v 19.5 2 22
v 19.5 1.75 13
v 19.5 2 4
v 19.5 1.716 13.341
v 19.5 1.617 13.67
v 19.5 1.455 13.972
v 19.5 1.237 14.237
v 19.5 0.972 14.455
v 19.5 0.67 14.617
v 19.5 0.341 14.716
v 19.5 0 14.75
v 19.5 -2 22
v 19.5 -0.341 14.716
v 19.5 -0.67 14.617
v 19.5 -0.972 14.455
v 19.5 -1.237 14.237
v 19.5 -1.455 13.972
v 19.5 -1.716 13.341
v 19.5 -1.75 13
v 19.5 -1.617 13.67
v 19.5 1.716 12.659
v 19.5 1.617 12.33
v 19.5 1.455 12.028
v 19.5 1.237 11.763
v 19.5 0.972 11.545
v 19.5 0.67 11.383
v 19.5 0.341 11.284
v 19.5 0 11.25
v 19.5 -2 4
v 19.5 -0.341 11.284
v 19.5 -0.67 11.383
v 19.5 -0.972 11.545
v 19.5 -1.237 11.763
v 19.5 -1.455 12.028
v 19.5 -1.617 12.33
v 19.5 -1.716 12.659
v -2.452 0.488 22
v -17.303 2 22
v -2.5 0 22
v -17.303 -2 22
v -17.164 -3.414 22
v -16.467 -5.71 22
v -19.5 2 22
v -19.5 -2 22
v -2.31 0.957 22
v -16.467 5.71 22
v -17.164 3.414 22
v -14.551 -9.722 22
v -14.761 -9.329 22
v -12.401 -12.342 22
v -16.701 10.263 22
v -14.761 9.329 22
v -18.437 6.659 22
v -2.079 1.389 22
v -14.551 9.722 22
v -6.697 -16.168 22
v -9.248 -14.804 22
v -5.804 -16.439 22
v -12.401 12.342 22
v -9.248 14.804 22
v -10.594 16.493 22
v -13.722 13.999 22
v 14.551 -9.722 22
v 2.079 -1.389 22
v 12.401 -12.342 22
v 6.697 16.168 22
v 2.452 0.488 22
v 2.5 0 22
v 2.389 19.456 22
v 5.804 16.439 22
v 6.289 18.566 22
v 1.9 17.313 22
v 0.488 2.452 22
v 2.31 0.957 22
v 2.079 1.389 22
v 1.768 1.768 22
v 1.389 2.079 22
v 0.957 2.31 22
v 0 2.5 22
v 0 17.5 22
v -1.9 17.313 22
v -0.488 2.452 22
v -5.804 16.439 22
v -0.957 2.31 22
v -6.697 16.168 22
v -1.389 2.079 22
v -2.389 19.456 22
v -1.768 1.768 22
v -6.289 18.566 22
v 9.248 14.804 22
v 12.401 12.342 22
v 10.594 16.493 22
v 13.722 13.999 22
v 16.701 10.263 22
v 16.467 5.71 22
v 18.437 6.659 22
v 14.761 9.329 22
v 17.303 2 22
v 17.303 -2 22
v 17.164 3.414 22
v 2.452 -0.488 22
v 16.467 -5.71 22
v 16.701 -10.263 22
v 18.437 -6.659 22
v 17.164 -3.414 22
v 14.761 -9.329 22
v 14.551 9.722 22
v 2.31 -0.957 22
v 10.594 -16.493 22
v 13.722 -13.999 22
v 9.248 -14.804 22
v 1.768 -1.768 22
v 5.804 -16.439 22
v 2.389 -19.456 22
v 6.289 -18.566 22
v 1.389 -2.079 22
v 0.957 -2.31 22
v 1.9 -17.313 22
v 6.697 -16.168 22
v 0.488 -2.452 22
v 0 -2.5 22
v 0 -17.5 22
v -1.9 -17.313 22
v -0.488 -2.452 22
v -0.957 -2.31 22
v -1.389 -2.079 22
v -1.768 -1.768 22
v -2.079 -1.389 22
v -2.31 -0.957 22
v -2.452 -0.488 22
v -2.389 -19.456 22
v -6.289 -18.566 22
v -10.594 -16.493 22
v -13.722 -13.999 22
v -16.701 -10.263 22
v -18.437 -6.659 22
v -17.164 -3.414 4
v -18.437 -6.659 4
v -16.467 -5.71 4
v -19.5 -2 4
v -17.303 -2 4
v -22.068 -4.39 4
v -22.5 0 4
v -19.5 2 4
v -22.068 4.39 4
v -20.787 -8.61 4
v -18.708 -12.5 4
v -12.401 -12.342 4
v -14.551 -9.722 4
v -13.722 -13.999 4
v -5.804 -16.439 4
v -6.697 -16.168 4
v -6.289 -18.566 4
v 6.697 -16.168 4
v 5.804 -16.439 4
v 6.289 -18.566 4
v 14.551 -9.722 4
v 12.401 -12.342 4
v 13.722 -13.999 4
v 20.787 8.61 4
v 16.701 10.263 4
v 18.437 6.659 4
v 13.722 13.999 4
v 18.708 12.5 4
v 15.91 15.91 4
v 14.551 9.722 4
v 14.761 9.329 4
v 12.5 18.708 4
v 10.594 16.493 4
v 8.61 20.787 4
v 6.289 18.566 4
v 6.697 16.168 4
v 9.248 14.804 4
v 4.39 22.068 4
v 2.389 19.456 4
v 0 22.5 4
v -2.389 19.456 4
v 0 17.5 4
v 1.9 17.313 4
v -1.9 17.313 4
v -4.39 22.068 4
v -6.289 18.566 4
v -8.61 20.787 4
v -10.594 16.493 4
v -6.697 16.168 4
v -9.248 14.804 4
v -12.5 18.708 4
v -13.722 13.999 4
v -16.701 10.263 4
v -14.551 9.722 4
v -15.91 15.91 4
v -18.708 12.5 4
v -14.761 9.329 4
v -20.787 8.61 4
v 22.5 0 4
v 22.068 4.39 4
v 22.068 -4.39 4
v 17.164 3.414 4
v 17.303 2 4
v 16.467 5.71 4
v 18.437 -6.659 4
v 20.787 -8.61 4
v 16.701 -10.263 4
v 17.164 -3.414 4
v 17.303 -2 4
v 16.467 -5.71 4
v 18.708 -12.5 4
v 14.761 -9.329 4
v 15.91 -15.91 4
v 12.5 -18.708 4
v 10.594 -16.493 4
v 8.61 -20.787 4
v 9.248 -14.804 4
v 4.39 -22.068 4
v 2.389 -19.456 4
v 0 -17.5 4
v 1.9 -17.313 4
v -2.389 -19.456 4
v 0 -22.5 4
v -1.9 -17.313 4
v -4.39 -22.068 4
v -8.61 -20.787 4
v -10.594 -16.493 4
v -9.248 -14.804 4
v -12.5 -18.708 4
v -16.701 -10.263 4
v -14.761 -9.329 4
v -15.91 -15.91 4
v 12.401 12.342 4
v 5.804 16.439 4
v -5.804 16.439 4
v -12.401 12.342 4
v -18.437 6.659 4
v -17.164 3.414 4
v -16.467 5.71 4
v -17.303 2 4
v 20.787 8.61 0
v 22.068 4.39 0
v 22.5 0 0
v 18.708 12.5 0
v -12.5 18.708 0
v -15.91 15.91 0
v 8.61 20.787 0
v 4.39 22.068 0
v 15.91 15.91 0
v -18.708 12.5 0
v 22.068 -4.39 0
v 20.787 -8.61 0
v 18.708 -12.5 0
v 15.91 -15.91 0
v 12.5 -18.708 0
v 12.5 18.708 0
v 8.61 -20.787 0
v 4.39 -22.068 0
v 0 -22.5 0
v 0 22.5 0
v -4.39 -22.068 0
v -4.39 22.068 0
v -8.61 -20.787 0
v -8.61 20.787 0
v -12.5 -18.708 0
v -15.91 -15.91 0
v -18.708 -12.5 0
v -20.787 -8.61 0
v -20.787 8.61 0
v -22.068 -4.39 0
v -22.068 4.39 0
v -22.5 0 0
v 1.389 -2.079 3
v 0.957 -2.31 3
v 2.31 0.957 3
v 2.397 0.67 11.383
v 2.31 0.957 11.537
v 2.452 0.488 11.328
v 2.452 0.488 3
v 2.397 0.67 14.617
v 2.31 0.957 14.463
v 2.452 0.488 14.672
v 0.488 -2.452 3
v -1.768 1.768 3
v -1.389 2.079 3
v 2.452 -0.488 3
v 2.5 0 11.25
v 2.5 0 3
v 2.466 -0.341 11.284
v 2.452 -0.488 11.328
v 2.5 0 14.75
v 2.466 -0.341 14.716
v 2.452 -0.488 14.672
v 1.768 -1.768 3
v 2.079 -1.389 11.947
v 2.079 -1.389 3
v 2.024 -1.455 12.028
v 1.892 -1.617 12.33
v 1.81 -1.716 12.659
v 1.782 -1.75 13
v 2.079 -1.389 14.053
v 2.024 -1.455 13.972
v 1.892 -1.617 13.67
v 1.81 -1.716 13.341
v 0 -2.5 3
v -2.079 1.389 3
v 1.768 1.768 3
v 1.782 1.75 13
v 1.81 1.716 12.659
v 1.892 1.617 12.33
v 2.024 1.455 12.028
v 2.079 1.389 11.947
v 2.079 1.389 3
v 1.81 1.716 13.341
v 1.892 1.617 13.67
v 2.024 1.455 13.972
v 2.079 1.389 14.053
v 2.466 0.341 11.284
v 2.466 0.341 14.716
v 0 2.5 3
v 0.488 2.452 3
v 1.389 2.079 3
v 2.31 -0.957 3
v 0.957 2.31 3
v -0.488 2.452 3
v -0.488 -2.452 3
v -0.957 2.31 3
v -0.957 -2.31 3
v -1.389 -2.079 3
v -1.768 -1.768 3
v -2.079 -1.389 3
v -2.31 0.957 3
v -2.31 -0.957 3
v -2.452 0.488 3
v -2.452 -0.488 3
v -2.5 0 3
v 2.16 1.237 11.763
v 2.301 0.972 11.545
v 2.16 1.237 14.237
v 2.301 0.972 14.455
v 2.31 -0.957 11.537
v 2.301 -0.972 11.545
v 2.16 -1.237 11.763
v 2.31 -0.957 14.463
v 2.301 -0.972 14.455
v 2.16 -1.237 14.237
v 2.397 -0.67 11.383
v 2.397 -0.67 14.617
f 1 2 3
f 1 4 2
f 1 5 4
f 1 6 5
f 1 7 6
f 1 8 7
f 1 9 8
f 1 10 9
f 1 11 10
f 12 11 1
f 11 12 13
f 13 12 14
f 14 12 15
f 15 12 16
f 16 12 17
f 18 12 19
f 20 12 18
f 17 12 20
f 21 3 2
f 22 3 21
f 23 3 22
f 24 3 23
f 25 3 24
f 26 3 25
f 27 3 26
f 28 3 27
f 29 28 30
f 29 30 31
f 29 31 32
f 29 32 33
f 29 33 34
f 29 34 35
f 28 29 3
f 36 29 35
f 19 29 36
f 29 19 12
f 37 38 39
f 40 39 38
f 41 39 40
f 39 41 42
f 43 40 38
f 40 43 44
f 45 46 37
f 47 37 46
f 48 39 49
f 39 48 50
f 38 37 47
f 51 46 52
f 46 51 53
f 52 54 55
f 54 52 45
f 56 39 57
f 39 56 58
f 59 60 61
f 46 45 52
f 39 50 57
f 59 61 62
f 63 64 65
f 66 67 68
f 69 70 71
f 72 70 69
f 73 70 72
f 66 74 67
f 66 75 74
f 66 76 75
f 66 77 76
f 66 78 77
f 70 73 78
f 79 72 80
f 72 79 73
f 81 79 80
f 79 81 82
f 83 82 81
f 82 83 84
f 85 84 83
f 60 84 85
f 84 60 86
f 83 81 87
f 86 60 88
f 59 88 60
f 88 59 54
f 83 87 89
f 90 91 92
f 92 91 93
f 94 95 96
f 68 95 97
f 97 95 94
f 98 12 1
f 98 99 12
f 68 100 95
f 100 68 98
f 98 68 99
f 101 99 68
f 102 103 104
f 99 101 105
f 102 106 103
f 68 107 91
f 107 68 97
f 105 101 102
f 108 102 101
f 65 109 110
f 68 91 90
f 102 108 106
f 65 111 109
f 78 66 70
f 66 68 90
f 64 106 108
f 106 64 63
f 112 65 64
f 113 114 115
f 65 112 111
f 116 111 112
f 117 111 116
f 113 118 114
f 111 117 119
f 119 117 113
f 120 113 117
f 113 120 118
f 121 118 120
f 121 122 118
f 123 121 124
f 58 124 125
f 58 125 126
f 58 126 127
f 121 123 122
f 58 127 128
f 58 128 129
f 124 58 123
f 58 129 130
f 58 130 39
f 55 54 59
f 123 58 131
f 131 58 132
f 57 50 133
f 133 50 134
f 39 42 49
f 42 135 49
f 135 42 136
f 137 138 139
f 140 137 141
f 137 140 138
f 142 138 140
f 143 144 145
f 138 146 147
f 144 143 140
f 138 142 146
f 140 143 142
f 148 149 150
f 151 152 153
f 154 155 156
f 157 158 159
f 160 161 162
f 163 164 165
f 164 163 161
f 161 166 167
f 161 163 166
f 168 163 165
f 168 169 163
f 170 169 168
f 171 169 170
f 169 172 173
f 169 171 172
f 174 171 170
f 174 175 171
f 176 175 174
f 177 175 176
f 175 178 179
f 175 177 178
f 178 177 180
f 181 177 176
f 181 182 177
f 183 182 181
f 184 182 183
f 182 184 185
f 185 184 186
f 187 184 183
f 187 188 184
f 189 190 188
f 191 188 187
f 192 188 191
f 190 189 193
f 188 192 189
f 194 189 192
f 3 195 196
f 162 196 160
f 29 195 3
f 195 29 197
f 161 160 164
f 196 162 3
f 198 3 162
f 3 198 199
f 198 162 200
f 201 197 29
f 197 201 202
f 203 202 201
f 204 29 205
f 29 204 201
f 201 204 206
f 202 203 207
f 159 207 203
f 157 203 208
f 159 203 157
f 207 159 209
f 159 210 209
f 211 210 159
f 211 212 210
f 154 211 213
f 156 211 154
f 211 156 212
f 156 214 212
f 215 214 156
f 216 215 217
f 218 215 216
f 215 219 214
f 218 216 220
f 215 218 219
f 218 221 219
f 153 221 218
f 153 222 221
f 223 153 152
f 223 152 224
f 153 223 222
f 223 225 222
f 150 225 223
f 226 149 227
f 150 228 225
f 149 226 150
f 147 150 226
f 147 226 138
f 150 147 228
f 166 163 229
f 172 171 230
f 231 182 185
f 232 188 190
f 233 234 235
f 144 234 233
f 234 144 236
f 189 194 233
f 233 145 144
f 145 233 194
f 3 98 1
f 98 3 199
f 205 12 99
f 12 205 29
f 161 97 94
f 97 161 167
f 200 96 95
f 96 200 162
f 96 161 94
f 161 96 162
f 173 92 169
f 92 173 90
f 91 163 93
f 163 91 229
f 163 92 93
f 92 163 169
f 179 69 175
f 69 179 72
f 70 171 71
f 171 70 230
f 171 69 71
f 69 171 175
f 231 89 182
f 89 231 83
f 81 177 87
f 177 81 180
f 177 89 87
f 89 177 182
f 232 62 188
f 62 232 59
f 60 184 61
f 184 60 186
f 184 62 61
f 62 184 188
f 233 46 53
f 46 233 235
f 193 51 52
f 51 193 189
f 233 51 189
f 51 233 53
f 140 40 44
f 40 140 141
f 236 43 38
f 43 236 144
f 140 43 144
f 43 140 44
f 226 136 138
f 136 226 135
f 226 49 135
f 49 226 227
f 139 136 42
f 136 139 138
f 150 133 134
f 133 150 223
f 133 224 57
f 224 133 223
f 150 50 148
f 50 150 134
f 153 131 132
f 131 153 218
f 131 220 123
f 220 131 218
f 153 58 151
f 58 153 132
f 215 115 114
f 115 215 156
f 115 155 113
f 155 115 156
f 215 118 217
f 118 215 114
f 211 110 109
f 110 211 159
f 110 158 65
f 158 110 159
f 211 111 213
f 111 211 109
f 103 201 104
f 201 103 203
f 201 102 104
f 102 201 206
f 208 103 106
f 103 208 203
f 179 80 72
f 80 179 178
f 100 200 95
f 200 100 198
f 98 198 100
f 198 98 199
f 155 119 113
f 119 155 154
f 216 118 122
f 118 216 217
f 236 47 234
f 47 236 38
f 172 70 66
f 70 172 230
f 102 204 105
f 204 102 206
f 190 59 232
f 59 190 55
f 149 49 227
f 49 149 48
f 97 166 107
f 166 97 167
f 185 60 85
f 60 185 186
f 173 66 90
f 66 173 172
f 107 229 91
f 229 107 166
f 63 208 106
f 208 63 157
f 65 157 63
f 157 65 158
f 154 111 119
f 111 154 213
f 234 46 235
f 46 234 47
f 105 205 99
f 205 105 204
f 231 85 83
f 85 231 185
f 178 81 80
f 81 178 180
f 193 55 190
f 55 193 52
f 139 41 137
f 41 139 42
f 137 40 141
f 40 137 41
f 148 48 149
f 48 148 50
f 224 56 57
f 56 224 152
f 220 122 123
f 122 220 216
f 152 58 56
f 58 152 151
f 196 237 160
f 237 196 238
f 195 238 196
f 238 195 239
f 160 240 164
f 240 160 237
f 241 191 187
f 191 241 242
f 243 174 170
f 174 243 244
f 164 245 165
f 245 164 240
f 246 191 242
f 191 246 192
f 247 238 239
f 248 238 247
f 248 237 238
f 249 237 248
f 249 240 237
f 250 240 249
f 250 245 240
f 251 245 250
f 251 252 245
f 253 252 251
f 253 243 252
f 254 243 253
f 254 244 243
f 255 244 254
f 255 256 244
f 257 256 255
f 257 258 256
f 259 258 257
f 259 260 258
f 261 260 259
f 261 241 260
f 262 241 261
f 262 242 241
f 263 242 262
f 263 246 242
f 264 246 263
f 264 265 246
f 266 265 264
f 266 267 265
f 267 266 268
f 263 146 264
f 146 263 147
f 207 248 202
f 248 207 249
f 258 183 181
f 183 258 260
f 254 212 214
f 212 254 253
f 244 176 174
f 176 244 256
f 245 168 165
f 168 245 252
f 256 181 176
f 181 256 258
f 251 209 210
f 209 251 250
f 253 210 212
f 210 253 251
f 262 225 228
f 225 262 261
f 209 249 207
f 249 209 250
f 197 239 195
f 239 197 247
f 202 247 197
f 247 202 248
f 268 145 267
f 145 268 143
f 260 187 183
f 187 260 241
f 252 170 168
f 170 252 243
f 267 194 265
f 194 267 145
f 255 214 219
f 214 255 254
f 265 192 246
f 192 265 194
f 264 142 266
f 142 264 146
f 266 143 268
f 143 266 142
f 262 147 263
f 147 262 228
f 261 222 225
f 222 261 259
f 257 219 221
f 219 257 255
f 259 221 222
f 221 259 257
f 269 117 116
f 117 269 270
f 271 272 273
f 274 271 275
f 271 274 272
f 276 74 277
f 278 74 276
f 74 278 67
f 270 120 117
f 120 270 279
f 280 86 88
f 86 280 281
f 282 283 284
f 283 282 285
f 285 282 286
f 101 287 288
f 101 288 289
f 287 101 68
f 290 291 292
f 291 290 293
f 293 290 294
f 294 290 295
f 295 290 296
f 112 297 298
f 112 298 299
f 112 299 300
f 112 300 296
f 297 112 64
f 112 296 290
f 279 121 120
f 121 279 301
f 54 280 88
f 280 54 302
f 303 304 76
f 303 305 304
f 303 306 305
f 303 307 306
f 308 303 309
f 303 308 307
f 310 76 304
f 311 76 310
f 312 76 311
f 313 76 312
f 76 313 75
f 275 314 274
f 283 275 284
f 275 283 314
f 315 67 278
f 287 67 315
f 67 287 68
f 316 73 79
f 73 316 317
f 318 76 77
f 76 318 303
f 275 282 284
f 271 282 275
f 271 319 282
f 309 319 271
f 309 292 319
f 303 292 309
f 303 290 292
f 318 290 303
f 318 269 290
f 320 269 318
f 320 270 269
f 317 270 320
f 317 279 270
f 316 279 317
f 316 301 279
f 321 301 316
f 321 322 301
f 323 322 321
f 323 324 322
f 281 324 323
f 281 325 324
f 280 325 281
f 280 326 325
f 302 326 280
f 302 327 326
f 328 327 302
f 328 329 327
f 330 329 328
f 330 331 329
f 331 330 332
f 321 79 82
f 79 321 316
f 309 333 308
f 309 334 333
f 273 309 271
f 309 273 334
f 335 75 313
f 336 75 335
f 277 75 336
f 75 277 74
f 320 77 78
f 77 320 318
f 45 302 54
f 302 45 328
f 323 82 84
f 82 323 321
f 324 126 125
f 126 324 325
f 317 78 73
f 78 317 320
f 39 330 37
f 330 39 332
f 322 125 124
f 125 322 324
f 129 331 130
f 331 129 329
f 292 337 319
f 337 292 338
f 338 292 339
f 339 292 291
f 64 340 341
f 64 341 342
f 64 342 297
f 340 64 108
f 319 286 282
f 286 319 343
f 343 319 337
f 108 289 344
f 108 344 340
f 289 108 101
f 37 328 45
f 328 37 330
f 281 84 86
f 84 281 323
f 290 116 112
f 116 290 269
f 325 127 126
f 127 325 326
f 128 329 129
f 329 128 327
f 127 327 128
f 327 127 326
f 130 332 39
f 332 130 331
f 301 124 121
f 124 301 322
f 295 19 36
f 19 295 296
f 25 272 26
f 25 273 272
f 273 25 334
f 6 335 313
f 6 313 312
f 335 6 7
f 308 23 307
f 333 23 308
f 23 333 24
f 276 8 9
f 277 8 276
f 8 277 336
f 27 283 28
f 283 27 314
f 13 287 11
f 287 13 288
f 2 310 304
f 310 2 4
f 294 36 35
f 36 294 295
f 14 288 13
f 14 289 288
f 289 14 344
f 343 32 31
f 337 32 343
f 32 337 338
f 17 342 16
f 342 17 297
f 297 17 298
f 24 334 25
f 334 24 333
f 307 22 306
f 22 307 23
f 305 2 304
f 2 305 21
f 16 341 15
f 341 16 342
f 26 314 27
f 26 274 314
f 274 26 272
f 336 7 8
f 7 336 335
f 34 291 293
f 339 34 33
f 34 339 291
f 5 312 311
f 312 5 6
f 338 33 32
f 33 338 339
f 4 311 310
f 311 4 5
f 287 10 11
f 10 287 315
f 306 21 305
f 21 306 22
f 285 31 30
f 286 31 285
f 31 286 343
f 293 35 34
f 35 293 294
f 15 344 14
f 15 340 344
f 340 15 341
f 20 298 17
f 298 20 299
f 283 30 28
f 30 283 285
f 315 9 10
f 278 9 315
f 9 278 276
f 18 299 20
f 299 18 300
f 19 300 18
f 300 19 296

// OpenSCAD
$fn = 32;

// ----------------------------------------------------------------------
// Control knob: skirt knob with grip ribs
// ----------------------------------------------------------------------

// --- parameters (mm) ---
skirt_d = 45;             // skirt diameter
skirt_t = 4;              // skirt thickness
rib_w = 4;                // grip rib width
rib_out = 3;              // grip rib radial protrusion
n_ribs = 14;              // number of grip ribs
knob_d = 35;              // knob body diameter
knob_h = 18;              // knob body height
bore_d = 5;               // shaft bore diameter
set_d = 3.5;              // set screw bore diameter

rib_step = 360 / n_ribs;  // rib angular step
total_h = skirt_t + knob_h;  // overall height

difference() {
  union() {
    translate([0, 0, skirt_t]) cylinder(h = knob_h, d = knob_d);
    cylinder(h = skirt_t, d = skirt_d);
    for (i = [0 : n_ribs - 1])
      rotate([0, 0, i * rib_step])
        translate([knob_d / 2 - 1, -rib_w / 2, skirt_t])
          cube([rib_out, rib_w, knob_h]);
  }
  translate([0, 0, skirt_t - 1]) cylinder(h = knob_h + 2, d = bore_d);
  translate([-1, 0, skirt_t + knob_h / 2]) rotate([0, 90, 0])
    cylinder(h = knob_d / 2 + bore_d / 2 + 2, d = set_d);
}
